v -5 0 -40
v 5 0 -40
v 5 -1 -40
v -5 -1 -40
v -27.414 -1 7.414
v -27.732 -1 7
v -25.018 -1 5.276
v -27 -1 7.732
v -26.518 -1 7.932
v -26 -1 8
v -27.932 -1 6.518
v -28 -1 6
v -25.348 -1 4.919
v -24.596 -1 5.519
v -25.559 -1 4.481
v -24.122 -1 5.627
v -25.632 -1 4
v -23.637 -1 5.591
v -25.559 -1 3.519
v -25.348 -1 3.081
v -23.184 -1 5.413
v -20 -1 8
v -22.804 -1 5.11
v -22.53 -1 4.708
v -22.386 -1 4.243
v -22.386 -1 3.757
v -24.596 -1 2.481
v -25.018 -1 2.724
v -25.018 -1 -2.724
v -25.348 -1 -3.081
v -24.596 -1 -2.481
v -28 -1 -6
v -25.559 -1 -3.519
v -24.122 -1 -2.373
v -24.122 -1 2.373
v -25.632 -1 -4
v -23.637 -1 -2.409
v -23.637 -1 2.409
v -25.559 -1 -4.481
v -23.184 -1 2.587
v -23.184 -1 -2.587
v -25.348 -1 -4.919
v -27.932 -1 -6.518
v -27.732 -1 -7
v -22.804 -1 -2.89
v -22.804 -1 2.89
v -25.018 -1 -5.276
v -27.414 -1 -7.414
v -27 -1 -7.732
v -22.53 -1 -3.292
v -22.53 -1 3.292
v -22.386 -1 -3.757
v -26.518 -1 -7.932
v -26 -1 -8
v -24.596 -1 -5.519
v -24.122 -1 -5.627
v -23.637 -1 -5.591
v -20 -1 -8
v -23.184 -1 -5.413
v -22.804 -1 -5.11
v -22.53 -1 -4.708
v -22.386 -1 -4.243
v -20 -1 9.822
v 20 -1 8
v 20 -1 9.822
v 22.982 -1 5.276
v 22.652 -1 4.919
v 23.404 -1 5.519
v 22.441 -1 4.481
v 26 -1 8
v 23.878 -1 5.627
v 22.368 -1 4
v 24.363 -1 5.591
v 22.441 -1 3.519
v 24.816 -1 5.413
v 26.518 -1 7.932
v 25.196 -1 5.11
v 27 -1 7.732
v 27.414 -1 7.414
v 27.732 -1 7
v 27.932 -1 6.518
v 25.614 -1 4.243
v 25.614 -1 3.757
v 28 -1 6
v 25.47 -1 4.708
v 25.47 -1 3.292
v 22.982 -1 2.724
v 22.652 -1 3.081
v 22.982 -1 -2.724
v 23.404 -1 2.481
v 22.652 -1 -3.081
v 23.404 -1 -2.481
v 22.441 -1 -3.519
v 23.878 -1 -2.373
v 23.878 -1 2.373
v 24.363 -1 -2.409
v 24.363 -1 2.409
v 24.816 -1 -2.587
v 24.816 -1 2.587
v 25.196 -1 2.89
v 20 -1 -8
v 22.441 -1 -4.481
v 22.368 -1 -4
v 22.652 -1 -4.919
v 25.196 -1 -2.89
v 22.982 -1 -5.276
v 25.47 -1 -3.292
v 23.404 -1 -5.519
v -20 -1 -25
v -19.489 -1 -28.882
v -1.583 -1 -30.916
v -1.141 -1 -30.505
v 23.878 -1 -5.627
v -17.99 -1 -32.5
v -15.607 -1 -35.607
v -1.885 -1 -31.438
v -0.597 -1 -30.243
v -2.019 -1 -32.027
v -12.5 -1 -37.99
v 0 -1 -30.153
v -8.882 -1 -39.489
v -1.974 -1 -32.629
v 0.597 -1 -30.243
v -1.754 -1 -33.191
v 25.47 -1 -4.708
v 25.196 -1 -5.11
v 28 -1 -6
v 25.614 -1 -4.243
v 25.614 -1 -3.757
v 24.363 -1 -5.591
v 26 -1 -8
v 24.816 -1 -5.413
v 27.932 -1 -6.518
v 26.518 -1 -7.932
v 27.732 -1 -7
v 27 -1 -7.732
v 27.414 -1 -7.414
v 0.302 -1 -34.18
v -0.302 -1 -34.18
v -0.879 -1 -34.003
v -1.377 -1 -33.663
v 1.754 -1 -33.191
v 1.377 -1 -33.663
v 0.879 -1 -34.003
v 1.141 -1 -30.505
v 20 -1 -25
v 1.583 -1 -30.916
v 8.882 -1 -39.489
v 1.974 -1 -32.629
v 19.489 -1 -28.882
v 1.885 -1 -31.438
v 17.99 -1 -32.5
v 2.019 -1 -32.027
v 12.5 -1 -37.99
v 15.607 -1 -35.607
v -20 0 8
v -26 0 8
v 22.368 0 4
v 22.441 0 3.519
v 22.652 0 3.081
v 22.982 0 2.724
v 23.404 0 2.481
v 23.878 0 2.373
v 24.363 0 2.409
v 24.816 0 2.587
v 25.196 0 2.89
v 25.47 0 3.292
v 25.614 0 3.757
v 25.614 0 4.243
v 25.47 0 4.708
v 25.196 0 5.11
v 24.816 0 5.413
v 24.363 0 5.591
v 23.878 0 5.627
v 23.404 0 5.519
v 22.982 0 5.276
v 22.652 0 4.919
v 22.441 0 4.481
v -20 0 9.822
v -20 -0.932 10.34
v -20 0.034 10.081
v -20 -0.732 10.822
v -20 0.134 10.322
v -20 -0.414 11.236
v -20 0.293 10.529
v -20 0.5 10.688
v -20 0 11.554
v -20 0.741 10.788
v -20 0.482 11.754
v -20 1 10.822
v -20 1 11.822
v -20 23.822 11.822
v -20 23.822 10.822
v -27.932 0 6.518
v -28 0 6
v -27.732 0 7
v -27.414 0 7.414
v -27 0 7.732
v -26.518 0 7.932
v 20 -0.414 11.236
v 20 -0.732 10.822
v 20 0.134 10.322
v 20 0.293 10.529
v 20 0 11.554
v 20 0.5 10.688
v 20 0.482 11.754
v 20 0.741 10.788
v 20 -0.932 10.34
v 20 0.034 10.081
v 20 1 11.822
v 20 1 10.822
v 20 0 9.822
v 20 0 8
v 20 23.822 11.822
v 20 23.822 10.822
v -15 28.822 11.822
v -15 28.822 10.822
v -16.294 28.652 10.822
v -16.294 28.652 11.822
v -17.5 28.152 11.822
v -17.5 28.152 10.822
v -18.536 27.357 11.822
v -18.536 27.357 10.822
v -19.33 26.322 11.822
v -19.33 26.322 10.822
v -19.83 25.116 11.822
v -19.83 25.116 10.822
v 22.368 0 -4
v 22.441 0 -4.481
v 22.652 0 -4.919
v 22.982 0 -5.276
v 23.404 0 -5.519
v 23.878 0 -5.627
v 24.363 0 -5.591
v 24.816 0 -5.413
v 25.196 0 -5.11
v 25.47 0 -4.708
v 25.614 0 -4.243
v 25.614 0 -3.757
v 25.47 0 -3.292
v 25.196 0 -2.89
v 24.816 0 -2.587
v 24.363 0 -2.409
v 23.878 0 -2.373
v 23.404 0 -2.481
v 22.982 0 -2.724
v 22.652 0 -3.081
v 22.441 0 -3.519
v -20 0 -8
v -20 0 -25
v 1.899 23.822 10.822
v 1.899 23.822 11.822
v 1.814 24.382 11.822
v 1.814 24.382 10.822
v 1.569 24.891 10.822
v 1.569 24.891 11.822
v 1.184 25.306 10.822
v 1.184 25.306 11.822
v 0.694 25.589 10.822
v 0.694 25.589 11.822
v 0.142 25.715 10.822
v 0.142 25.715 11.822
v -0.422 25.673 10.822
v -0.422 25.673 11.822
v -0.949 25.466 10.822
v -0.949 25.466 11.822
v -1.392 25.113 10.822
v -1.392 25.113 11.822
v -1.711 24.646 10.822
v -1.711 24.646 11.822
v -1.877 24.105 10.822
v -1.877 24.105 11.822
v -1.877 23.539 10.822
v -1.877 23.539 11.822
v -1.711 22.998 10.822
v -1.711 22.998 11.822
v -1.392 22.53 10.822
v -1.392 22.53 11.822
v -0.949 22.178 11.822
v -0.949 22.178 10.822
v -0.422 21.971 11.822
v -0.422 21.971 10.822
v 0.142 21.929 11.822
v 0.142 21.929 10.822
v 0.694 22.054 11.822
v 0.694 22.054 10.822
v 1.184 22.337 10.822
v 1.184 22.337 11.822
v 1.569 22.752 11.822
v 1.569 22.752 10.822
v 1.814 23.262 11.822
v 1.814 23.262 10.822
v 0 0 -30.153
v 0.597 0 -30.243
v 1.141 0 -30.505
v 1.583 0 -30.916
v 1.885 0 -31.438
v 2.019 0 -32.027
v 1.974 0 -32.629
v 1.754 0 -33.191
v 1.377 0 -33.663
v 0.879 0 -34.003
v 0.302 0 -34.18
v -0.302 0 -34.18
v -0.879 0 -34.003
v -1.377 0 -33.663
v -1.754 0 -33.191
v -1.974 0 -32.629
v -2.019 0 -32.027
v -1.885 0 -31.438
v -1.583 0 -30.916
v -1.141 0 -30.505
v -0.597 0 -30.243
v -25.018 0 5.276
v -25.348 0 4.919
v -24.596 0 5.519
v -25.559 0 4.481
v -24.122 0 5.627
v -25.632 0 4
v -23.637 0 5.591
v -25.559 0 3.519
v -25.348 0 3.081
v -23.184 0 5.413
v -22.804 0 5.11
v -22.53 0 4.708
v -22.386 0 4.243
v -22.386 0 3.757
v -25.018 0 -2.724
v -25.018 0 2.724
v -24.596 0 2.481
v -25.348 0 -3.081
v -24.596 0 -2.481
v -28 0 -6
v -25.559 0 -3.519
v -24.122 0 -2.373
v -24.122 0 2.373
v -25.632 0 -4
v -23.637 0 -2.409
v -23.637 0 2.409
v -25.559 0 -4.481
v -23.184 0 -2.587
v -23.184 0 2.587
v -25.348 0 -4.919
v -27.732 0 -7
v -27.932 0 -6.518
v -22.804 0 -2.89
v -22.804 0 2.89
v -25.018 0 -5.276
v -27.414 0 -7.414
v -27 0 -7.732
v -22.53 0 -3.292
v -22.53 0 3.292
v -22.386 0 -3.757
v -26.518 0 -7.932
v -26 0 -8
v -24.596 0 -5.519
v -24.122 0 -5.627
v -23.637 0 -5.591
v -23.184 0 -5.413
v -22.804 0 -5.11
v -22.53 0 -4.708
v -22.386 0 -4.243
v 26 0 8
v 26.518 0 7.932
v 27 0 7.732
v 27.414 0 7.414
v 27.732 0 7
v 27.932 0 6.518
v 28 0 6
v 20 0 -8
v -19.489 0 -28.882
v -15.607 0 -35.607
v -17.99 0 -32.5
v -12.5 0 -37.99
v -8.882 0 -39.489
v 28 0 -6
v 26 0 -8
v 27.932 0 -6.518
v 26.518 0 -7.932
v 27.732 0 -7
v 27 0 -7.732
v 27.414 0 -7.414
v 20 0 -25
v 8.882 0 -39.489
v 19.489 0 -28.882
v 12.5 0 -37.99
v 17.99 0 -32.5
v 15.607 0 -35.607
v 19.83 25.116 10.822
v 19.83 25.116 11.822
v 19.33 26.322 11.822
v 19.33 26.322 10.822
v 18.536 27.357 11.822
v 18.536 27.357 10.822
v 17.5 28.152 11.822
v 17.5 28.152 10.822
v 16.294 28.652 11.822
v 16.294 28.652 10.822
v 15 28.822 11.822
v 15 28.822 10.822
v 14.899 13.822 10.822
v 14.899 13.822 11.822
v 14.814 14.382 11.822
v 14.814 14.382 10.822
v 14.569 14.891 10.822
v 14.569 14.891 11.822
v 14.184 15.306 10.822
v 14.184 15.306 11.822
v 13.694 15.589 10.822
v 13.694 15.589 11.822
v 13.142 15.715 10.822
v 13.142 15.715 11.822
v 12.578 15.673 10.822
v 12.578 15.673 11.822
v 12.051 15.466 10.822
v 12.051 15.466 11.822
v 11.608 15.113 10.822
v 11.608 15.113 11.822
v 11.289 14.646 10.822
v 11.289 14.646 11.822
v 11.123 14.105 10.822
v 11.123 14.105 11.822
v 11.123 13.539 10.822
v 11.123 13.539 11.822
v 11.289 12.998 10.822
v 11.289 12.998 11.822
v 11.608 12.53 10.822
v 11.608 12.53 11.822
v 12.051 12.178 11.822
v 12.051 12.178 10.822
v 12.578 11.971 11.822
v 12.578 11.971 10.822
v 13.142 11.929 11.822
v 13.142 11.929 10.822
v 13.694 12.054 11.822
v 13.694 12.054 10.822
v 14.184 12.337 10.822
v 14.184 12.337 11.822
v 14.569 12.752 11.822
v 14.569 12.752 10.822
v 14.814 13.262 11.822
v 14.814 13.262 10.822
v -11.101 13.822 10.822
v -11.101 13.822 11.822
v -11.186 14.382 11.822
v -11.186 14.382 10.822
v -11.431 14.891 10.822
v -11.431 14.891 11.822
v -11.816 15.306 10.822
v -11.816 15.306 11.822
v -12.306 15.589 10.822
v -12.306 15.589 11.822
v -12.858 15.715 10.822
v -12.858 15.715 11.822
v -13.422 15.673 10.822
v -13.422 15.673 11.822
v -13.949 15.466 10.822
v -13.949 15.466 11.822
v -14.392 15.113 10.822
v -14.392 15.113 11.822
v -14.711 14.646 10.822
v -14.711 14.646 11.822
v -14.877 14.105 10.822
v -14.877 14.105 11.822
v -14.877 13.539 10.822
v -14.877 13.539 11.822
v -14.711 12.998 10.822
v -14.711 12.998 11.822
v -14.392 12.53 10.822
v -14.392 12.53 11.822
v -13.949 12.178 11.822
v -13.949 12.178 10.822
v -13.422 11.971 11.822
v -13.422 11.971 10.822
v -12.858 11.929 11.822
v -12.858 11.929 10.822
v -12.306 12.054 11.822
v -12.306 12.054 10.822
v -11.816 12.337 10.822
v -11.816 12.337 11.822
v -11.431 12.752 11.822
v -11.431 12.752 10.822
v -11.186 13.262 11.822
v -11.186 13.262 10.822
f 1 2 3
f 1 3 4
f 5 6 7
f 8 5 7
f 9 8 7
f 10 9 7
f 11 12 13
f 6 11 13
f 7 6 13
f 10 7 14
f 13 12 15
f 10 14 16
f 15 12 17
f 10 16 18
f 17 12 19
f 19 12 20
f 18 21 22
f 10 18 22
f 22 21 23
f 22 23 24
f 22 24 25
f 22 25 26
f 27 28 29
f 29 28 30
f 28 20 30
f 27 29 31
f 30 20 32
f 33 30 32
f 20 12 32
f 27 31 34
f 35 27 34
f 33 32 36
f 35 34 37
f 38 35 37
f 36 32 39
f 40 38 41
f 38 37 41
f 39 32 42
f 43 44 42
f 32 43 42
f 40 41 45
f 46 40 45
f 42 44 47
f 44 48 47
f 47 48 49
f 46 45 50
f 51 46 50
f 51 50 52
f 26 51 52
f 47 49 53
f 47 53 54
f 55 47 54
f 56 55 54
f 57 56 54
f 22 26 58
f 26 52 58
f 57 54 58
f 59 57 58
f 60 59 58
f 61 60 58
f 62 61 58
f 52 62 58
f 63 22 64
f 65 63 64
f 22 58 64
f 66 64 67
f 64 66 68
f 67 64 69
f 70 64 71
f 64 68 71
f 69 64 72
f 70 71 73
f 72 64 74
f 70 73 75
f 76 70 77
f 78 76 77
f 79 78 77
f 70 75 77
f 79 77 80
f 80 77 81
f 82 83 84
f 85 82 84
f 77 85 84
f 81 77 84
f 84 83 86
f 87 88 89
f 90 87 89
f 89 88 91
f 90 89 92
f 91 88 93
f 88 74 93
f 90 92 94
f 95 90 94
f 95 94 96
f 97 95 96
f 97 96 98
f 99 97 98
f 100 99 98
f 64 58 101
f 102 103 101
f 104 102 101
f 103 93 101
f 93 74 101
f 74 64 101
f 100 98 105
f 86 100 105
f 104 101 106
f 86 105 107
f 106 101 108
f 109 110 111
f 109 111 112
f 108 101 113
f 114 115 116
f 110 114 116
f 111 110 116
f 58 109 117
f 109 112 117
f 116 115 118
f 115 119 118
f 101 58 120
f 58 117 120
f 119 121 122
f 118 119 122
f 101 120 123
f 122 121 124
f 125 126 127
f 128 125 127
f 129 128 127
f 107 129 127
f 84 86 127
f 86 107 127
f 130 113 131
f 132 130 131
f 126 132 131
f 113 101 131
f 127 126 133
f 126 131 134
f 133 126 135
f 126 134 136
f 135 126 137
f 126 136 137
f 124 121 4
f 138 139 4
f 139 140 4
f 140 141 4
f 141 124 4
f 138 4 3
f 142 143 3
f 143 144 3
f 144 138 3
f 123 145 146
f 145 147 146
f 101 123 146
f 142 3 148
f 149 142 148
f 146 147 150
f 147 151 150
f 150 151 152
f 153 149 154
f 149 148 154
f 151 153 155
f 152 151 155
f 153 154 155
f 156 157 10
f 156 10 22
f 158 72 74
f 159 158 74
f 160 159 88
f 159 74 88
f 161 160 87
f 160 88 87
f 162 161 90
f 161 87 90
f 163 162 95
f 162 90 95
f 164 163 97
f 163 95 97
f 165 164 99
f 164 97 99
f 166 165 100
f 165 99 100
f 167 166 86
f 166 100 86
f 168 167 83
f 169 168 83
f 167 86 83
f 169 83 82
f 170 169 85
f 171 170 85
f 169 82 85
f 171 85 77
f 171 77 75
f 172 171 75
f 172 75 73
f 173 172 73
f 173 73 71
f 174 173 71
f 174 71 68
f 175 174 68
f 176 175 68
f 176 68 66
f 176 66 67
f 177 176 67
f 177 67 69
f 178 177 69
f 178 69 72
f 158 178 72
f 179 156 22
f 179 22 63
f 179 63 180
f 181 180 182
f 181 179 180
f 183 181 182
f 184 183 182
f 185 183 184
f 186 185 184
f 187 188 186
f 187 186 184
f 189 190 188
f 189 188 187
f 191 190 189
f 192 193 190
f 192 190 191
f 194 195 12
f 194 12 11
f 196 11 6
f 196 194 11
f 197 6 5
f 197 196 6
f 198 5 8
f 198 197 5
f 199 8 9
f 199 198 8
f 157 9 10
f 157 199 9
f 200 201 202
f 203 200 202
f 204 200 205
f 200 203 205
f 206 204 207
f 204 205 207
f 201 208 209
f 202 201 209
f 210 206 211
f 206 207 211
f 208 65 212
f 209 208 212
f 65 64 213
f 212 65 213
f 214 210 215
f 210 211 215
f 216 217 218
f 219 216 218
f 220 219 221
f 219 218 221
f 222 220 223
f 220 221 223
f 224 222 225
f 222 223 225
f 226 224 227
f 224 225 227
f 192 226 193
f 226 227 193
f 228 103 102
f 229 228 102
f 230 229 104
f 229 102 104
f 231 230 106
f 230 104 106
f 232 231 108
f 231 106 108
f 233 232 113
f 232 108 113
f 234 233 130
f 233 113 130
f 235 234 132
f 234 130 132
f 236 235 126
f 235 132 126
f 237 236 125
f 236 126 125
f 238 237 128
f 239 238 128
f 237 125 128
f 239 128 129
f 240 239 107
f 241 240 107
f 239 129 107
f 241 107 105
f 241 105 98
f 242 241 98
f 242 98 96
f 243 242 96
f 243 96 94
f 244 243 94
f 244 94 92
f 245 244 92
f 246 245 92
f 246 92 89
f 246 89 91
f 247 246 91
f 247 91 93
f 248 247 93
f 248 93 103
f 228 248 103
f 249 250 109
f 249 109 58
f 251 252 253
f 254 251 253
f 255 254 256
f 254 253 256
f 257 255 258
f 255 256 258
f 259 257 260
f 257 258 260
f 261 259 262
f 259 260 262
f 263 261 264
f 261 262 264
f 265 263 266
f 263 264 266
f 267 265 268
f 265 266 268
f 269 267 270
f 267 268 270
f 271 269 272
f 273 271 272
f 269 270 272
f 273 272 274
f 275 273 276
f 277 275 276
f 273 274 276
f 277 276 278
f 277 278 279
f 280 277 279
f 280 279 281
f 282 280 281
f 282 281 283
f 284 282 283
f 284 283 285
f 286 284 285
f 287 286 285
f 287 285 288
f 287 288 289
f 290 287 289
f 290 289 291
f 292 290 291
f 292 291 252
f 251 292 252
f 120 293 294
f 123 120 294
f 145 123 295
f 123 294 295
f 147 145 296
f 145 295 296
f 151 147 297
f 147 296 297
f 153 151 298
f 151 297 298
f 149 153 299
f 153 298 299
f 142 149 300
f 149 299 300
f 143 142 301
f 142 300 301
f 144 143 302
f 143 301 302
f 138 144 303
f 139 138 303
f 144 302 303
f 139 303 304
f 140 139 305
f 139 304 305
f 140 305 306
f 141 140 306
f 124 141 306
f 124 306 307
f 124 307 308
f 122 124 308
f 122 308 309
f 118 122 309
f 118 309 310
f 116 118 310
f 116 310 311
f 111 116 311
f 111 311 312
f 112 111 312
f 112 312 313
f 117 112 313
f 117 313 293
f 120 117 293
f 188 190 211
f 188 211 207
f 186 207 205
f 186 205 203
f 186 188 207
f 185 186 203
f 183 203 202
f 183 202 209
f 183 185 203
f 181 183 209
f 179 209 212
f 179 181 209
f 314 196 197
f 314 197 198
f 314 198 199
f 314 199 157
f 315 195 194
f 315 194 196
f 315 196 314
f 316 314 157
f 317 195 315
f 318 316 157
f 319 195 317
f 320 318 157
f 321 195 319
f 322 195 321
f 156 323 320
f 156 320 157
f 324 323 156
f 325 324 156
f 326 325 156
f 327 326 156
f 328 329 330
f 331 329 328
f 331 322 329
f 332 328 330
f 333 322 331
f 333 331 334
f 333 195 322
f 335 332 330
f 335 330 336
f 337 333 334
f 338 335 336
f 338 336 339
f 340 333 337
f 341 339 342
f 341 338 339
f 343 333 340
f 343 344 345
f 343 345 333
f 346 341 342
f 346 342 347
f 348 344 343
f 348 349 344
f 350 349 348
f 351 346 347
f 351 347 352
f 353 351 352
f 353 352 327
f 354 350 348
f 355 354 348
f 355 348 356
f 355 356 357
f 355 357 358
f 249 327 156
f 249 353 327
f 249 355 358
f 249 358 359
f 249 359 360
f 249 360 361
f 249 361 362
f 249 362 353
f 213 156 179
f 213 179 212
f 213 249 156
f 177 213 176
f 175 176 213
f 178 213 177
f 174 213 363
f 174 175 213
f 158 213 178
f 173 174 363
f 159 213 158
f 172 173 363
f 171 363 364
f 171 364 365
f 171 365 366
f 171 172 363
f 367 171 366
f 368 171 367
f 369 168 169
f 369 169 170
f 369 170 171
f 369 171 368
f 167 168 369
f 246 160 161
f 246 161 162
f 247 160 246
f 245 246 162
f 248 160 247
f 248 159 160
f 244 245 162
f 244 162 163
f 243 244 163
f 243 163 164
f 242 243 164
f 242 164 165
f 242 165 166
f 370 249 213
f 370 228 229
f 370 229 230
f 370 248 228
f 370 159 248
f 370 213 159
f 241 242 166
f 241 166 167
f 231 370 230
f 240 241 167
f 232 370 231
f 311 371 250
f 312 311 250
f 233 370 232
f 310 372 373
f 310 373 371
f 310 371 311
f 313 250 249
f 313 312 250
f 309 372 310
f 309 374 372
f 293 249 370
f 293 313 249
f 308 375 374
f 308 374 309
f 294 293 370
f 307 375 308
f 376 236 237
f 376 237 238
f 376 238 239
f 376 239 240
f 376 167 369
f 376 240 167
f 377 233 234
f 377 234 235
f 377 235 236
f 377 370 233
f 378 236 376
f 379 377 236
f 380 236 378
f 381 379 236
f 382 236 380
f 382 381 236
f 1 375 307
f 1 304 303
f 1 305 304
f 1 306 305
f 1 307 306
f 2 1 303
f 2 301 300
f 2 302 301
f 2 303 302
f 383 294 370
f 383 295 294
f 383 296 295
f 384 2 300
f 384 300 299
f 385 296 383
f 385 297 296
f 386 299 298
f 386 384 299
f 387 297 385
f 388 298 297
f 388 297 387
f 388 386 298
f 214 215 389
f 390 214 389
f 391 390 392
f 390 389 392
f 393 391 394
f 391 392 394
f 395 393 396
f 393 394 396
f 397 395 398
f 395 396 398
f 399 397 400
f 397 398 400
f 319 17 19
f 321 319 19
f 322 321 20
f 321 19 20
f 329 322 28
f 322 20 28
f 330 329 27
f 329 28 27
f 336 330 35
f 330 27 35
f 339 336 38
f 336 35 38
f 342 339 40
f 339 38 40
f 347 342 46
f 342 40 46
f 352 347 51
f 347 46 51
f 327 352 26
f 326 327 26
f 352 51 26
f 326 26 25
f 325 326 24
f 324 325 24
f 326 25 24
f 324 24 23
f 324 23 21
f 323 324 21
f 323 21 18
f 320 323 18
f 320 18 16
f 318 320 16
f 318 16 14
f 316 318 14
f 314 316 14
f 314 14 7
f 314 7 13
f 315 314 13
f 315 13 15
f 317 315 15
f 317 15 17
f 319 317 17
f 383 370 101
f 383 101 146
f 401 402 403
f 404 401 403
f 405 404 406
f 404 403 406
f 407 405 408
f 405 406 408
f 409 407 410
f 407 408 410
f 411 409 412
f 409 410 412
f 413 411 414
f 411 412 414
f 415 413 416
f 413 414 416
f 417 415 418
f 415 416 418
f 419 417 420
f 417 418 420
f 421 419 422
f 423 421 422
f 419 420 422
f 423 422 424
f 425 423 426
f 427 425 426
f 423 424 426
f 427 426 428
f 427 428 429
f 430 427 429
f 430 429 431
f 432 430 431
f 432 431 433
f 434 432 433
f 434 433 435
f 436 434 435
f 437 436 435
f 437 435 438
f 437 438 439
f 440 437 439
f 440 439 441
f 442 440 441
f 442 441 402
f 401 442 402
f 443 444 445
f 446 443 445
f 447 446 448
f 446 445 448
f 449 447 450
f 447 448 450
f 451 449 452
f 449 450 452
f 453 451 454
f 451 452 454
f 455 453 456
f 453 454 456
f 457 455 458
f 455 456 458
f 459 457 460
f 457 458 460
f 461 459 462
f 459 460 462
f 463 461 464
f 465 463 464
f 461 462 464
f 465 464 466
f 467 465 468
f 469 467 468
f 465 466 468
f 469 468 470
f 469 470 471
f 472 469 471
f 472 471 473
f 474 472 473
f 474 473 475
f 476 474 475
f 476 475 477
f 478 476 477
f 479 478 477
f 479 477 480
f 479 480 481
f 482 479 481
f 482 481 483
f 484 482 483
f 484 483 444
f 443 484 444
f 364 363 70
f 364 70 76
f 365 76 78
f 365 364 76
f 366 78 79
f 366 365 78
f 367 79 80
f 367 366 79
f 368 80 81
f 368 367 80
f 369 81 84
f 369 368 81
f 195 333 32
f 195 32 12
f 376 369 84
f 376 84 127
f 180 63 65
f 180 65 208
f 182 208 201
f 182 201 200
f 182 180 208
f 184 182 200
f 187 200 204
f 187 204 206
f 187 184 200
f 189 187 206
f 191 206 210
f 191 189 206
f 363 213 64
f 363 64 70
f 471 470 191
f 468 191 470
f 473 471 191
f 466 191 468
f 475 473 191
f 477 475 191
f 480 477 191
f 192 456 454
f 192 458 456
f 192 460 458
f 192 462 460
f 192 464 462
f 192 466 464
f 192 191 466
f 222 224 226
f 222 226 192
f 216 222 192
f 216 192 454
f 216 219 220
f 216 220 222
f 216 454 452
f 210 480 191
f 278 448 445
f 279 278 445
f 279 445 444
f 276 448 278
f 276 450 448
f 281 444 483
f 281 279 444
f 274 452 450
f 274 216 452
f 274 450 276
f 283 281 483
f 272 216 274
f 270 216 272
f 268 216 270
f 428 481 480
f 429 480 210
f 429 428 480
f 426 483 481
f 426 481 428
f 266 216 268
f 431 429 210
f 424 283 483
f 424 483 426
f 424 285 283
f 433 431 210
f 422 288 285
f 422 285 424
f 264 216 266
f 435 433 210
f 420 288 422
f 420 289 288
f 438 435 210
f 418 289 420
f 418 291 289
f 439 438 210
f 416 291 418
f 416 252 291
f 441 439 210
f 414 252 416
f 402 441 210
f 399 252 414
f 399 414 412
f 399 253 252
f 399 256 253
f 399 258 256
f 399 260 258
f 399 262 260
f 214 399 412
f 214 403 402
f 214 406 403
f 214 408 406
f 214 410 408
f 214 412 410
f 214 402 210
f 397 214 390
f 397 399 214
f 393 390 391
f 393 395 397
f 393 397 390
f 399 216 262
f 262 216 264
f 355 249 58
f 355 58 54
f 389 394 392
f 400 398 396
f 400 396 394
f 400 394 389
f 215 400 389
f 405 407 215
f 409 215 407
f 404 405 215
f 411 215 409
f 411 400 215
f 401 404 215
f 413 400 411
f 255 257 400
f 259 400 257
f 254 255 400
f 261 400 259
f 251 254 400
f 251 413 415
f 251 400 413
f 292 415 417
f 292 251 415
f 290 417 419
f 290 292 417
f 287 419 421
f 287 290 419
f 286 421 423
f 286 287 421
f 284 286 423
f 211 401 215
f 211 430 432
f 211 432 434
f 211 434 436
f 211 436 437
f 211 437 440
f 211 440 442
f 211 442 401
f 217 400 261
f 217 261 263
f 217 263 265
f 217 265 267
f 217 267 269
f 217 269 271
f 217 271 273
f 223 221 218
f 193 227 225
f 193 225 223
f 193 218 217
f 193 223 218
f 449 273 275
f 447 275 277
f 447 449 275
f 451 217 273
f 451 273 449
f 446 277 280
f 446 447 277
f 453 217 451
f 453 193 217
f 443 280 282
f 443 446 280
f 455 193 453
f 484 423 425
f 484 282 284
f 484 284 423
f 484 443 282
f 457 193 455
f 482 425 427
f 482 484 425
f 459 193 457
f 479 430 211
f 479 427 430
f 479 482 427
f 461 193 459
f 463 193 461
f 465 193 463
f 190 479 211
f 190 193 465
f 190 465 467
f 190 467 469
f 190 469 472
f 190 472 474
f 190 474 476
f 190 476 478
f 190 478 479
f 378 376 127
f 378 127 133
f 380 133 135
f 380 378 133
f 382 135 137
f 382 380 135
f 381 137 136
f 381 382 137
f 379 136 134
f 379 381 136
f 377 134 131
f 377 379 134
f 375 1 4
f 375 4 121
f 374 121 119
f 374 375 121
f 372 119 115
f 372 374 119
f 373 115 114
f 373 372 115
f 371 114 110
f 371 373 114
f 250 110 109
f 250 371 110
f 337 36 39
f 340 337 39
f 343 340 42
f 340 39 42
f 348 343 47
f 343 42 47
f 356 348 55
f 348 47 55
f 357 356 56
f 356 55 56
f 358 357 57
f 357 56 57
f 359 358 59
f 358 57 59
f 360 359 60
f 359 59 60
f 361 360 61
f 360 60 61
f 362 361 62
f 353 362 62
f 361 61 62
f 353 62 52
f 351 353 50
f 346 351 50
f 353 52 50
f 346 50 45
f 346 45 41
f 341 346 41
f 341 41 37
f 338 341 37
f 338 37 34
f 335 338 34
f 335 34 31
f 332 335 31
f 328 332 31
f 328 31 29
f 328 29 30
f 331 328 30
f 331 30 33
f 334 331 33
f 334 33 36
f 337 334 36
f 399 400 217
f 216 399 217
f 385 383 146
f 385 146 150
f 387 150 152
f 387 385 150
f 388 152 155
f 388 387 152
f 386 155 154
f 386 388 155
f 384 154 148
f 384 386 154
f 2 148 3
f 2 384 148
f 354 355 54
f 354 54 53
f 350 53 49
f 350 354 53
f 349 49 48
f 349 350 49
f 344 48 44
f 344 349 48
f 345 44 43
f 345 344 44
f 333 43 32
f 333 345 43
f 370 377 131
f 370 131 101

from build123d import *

# Parameters (mm, degrees)
BASE_FLANGE1_DEPTH       = 1
SKETCHED_START           = 11.616422755
SKETCHED_BEND1_OUTLINE_W = 40
SKETCHED_BEND1_OUTLINE_H = 1
SKETCHED_BEND1_DEPTH     = 28.383577245
SKETCHED_START_2         = 10.821902755
SKETCHED_BEND1_2_DEPTH   = 0.00548
SKETCHED_START_3         = 9.821902755
SKETCHED_BEND1_3_DEPTH   = 2
SKETCHED_START_4         = -20
SKETCHED_BEND1_4_DEPTH   = 40
SKETCH7_R                = 2.025
CUT_EXTRUDE1_DEPTH       = 10
F_6_CLEARANCE_HOLE1_D    = 3.7973
F_4_CLEARANCE_HOLE2_D    = 3.2639


with BuildPart() as part:
    # Base-Flange1: sheet metal written as solids
    # Sketch1 → Base-Flange1 (new body)
    with BuildSketch(Plane(origin=(0, 0, 0), x_dir=(1, 0, 0), z_dir=(0, 1, 0))):
        with BuildLine():
            Line((-20, -8), (-20, -35))
            ThreePointArc((-20, -35), (-18.535533906, -38.535533906), (-15, -40))
            Line((-15, -40), (15, -40))
            ThreePointArc((15, -40), (18.535533906, -38.535533906), (20, -35))
            Line((20, -35), (20, -8))
            Line((20, -8), (26, -8))
            ThreePointArc((26, -8), (27.414213562, -7.414213562), (28, -6))
            Line((28, -6), (28, 6))
            ThreePointArc((28, 6), (27.414213562, 7.414213562), (26, 8))
            Line((26, 8), (20, 8))
            Line((20, 8), (20, 25))
            ThreePointArc((20, 25), (15.606601718, 35.606601718), (5, 40))
            Line((5, 40), (-5, 40))
            ThreePointArc((-5, 40), (-15.606601718, 35.606601718), (-20, 25))
            Line((-20, 25), (-20, 8))
            Line((-20, 8), (-26, 8))
            ThreePointArc((-26, 8), (-27.414213562, 7.414213562), (-28, 6))
            Line((-28, 6), (-28, -6))
            ThreePointArc((-28, -6), (-27.414213562, -7.414213562), (-26, -8))
            Line((-26, -8), (-20, -8))
        make_face()
    extrude(amount=-BASE_FLANGE1_DEPTH)

    # Sketched Bend1: read off the stored shape, not the designer's step
    # Sketched Bend1 outline → Sketched Bend1 (cut)
    with BuildSketch(Plane.XY.offset(SKETCHED_START)):
        with Locations((0, -0.5)):
            Rectangle(SKETCHED_BEND1_OUTLINE_W, SKETCHED_BEND1_OUTLINE_H)
    extrude(amount=SKETCHED_BEND1_DEPTH, mode=Mode.SUBTRACT)

    # Sketched Bend1 2 outline → Sketched Bend1 2 (add)
    with BuildSketch(Plane.XY.offset(SKETCHED_START_2)):
        with BuildLine():
            Line((20, 0), (20, 23.821902755))
            ThreePointArc((20, 23.821902755), (18.535533906, 27.357436661), (15, 28.821902755))
            Line((15, 28.821902755), (-15, 28.821902755))
            ThreePointArc((-15, 28.821902755), (-18.535533906, 27.357436661), (-20, 23.821902755))
            Line((-20, 23.821902755), (-20, 0))
            Line((-20, 0), (20, 0))
        make_face()
    extrude(amount=SKETCHED_BEND1_2_DEPTH)

    # Sketched Bend1 3 outline → Sketched Bend1 3 (add)
    with BuildSketch(Plane.XY.offset(SKETCHED_START_3)):
        with BuildLine():
            Line((20, 0), (20, 23.821902755))
            ThreePointArc((20, 23.821902755), (18.535533906, 27.357436661), (15, 28.821902755))
            Line((15, 28.821902755), (-15, 28.821902755))
            ThreePointArc((-15, 28.821902755), (-18.535533906, 27.357436661), (-20, 23.821902755))
            Line((-20, 23.821902755), (-20, 0))
            Line((-20, 0), (20, 0))
        make_face()
    extrude(amount=SKETCHED_BEND1_3_DEPTH)

    # Sketched Bend1 4 outline → Sketched Bend1 4 (cut)
    with BuildSketch(Plane.YZ.offset(SKETCHED_START_4)):
        with BuildLine():
            Line((28.821902755, 9.821902755), (28.821902755, 10.821902755))
            Line((28.821902755, 10.821902755), (1, 10.821902755))
            ThreePointArc((1, 10.821902755), (0.292893219, 10.529009536), (0, 9.821902755))
            Line((0, 9.821902755), (28.821902755, 9.821902755))
        make_face()
        with BuildLine():
            ThreePointArc((-1, 9.821902755), (-0.414213562, 11.236116317), (1, 11.821902755))
            Line((1, 11.821902755), (0, 11.821902755))
            Line((0, 11.821902755), (0, 11.616422755))
            Line((0, 11.616422755), (-1, 11.616422755))
            Line((-1, 11.616422755), (-1, 9.821902755))
        make_face()
    extrude(amount=SKETCHED_BEND1_4_DEPTH, mode=Mode.SUBTRACT)

    # Sketch7 → Cut-Extrude1 (cut)
    with BuildSketch(Plane(origin=(0, 0, 0), x_dir=(1, 0, 0), z_dir=(0, 1, 0))):
        with Locations(Location((0, 32.178097245, 0), (0, 0, 270))):
            Circle(SKETCH7_R)
    extrude(amount=-CUT_EXTRUDE1_DEPTH, mode=Mode.SUBTRACT)

    # #6 Clearance Hole1 (through all)
    with Locations(Plane(origin=(0, 0, 10.821902755), x_dir=(-1, 0, 0), z_dir=(0, 0, -1))):
        with Locations((13, 13.821902755), (-13, 13.821902755), (0, 23.821902755)):
            Hole(F_6_CLEARANCE_HOLE1_D / 2)

    # #4 Clearance Hole2 (through all)
    with Locations(Plane(origin=(0, 0, 0), x_dir=(1, 0, 0), z_dir=(0, 1, 0))):
        with Locations((-24, 4), (-24, -4), (24, 4), (24, -4)):
            Hole(F_4_CLEARANCE_HOLE2_D / 2)


solid = part.part
